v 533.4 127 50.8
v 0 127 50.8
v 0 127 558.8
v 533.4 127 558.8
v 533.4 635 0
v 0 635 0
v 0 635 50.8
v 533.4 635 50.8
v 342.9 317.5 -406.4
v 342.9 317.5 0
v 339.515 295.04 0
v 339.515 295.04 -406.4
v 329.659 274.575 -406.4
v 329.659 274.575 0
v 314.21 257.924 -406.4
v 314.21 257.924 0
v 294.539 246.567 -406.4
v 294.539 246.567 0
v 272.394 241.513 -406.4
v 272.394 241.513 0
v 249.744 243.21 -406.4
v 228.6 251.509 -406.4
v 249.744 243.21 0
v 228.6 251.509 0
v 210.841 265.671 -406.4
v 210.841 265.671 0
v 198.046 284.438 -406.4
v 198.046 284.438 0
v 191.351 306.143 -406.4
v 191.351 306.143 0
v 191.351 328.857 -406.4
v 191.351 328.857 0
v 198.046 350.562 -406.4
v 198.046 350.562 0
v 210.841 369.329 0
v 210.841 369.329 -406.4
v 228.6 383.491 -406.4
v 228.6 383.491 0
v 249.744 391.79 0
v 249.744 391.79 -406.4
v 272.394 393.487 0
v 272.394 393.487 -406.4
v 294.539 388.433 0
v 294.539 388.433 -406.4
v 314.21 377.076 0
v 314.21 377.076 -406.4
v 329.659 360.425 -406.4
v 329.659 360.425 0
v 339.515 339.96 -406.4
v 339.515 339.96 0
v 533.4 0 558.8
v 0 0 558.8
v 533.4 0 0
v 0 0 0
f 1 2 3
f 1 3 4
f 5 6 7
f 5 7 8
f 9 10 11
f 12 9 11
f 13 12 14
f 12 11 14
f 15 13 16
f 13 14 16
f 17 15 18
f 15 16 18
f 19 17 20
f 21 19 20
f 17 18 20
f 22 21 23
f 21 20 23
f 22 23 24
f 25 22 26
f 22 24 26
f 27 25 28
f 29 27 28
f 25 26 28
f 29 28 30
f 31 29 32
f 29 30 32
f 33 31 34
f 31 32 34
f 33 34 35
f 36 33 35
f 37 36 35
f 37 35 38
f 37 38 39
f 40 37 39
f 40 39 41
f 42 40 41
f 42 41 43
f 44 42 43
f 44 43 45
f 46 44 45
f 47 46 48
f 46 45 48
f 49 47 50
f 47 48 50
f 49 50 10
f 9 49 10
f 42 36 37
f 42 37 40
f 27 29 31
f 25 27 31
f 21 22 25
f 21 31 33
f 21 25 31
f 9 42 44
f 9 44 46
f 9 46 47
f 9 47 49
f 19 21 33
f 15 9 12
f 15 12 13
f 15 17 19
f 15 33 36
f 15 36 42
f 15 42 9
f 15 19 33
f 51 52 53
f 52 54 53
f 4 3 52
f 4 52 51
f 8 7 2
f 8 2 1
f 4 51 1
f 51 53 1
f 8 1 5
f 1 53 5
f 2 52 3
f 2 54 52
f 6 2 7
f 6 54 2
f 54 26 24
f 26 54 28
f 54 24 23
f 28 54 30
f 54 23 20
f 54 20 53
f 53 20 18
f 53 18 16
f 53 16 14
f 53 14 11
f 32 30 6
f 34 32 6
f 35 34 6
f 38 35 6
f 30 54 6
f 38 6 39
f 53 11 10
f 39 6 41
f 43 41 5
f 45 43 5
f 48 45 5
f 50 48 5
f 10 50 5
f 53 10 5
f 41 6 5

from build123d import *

# Parameters (mm, degrees)
F0_W     = 533.4
F0_H     = 635
F1_DEPTH = 50.8
F2_W     = 533.4
F2_H     = 127
F3_DEPTH = 508
F4_R     = 76.2
F5_DEPTH = 406.4


with BuildPart() as f1:
    # F0 (on Top) → F1 (new body)
    with BuildSketch(Plane.XY):
        with Locations((266.7, 317.5)):
            Rectangle(F0_W, F0_H)
    extrude(amount=F1_DEPTH)

    # F2 (on face) → F3 (join)
    with BuildSketch(Plane.XY.offset(50.8)):
        with Locations((266.7, 63.5)):
            Rectangle(F2_W, F2_H)
    extrude(amount=F3_DEPTH)

    # F4 (on face) → F5 (join)
    with BuildSketch(Plane(origin=(0, 0, 0), x_dir=(1, 0, 0), z_dir=(0, 0, -1))):
        with Locations((266.7, -317.5)):
            Circle(F4_R)
    extrude(amount=F5_DEPTH)


solid = f1.part
